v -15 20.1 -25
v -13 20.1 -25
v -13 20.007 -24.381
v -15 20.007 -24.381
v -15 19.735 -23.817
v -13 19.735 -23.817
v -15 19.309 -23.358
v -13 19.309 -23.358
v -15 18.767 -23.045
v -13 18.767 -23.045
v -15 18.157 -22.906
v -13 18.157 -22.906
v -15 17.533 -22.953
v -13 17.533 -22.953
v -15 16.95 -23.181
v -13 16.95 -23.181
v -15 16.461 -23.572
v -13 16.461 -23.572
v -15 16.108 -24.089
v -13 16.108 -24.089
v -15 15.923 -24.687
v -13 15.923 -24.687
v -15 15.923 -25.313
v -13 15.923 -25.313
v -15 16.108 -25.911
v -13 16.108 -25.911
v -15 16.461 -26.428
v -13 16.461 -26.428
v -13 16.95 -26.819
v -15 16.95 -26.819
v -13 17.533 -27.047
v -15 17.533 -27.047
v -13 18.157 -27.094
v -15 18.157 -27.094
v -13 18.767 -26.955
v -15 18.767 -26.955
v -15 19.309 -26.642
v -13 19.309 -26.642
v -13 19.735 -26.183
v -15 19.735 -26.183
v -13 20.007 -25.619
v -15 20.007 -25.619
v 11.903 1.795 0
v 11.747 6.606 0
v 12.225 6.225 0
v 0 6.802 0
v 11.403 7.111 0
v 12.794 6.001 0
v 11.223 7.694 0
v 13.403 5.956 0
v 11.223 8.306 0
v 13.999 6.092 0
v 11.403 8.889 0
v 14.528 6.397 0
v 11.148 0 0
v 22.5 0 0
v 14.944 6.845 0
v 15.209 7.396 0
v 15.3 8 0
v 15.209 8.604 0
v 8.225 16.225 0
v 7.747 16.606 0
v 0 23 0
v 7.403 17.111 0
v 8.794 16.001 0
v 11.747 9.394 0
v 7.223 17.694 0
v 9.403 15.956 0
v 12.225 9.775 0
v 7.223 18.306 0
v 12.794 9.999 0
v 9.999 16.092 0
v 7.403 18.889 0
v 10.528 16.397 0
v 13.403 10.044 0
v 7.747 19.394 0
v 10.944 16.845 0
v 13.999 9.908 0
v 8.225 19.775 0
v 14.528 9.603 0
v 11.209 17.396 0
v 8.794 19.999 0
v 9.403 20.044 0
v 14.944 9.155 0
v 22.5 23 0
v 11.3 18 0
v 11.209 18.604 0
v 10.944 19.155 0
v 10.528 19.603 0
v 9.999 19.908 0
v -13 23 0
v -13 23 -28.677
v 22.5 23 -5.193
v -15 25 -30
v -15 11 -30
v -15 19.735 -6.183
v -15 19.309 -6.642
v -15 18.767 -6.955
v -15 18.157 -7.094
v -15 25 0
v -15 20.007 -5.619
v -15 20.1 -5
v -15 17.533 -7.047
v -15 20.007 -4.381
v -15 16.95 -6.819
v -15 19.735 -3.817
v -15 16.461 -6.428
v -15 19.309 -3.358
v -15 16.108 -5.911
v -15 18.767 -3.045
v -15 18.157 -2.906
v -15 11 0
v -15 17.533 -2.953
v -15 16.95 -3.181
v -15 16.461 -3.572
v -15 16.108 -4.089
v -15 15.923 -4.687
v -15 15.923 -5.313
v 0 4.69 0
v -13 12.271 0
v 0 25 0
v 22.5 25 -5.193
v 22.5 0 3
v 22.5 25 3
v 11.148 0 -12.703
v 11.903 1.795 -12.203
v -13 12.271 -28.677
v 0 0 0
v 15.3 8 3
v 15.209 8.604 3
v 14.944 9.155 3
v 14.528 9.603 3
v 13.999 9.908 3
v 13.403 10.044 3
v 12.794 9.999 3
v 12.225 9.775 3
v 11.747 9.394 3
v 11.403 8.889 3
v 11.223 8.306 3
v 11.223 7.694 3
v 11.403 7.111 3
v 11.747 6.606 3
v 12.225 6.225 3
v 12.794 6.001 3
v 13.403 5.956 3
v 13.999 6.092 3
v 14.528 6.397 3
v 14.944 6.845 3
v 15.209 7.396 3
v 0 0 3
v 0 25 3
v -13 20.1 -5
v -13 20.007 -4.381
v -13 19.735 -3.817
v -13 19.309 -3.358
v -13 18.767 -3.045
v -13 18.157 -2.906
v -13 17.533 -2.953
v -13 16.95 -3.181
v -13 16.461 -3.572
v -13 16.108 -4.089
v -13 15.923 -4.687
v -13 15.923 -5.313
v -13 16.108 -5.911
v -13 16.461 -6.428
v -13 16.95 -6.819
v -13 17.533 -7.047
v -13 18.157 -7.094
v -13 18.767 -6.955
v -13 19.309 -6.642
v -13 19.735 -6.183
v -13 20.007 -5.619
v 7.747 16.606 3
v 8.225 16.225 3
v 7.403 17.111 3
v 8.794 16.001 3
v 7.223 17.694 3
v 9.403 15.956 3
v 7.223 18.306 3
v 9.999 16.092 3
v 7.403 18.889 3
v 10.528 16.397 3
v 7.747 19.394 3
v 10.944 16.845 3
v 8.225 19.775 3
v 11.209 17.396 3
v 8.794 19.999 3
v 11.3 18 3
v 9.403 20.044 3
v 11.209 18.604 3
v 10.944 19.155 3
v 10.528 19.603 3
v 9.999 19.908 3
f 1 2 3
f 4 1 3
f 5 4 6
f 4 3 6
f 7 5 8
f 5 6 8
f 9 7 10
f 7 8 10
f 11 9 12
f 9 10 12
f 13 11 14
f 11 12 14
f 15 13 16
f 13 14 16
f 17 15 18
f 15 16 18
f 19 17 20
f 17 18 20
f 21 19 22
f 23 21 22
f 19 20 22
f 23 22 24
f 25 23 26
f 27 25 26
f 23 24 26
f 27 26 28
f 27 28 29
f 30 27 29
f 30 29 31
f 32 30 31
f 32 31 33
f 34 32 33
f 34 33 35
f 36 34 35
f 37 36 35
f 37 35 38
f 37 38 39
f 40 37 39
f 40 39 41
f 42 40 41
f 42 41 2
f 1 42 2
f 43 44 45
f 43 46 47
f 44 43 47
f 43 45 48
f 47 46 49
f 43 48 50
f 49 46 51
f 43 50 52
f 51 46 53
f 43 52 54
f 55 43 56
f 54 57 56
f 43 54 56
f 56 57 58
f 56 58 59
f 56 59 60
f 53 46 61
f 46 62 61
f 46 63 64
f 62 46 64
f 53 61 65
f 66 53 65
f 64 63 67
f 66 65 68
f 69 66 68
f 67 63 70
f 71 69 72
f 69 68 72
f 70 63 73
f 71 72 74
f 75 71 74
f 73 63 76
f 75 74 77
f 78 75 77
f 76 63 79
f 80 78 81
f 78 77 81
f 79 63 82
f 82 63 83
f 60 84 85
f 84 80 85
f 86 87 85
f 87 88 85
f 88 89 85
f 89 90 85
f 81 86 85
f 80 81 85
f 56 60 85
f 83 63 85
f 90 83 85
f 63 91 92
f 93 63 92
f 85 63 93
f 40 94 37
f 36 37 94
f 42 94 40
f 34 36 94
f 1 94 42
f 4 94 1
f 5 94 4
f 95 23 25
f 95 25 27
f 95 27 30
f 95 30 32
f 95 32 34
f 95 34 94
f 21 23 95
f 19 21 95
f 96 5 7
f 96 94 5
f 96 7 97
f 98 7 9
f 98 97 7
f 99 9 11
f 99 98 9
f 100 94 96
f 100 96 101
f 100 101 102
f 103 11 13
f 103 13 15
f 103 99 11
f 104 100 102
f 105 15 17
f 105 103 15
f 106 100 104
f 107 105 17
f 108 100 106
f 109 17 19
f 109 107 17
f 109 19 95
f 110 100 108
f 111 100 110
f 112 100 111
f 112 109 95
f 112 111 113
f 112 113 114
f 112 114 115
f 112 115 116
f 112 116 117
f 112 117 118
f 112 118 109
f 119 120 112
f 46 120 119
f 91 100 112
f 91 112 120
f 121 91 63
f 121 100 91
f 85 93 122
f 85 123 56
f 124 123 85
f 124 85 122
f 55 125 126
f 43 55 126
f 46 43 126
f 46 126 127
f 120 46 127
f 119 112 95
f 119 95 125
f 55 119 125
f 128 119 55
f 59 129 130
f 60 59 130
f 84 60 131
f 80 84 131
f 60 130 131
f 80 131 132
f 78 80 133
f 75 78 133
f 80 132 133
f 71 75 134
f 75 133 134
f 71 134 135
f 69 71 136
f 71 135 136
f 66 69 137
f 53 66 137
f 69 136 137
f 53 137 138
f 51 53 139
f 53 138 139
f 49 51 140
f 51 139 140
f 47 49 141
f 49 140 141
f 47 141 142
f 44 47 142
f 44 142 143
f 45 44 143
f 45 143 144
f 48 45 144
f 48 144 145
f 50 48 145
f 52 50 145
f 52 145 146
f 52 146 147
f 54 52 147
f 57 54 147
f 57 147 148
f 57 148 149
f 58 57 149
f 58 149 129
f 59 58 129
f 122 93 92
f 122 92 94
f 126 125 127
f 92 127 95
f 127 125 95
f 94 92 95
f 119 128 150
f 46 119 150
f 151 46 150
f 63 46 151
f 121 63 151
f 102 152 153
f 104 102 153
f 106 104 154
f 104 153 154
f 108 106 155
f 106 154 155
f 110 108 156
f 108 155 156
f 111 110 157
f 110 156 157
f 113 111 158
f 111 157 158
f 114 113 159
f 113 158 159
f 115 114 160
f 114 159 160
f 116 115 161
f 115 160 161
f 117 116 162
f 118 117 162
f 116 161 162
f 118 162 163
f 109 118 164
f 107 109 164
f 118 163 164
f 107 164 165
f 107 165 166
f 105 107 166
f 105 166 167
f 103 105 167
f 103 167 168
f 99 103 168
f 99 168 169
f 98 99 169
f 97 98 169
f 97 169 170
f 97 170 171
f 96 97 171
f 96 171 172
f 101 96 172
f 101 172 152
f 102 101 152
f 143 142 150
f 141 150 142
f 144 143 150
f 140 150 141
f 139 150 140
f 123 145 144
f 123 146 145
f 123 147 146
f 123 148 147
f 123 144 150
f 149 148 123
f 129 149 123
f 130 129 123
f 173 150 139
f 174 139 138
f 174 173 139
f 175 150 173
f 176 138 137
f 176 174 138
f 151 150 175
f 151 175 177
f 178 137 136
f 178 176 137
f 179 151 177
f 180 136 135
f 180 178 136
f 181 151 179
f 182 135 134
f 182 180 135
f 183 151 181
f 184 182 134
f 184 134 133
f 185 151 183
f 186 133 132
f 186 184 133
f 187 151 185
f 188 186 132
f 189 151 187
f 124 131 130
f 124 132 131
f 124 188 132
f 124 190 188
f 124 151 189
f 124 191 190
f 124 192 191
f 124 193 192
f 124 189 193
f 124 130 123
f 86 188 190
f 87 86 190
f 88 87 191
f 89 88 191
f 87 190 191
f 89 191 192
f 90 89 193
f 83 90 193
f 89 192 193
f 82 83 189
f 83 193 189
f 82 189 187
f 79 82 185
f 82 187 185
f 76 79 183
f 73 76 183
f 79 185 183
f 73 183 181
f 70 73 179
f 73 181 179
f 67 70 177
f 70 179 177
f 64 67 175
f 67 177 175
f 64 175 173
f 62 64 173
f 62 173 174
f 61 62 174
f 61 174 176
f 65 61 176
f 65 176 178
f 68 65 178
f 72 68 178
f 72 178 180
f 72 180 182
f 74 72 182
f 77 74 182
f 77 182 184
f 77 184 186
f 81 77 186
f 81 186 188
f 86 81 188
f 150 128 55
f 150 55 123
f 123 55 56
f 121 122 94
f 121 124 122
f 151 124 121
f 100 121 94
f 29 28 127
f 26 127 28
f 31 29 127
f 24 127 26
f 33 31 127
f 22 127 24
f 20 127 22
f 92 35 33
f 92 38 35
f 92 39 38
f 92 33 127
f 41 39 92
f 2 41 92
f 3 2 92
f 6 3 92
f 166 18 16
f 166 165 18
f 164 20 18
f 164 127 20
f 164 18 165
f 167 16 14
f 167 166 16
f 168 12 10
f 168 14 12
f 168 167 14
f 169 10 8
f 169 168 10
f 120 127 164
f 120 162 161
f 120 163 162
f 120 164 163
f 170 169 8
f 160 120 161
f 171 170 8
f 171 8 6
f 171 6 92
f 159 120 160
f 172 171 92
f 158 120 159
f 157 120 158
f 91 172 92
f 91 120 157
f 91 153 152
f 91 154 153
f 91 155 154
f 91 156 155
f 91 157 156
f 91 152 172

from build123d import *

# Parameters (mm, degrees)
F0_W     = 22.5
F0_H     = 25
F1_DEPTH = 3
F2_R     = 2.05
F3_DEPTH = 25
F4_W     = 2
F4_H     = 2
F4_W_2   = 35.5
F5_DEPTH = 30
F7_DEPTH = 25
F8_R     = 2.1
F9_DEPTH = 25


with BuildPart() as f1:
    # F0 (on Top) → F1 (new body)
    with BuildSketch(Plane.XY):
        with Locations((11.25, 12.5)):
            Rectangle(F0_W, F0_H)
    extrude(amount=F1_DEPTH)

    # F2 (on face) → F3 (cut)
    with BuildSketch(Plane.XY.offset(3)):
        with Locations((9.25, 18)):
            Circle(F2_R)
        with Locations((13.25, 8)):
            Circle(F2_R)
    extrude(amount=-F3_DEPTH, mode=Mode.SUBTRACT)

    # F4 (on Top) → F5 (join)
    with BuildSketch(Plane.XY):
        with Locations((-14, 24)):
            Rectangle(F4_W, F4_H)
        with Locations((4.75, 24)):
            Rectangle(F4_W_2, F4_H)
        Polygon((-13, 23), (-15, 23), (-15, 11), (-14.244832817, 12.7950885872), (-13, 12.2714058573), align=None)
        Polygon((-14.244832817, 12.7950885872), (-15, 11), (-13, 11), (-13, 12.2714058573), align=None)
        Polygon((-13, 11), (-15, 11), (11.1478185281, 0), (11.9029857111, 1.7950885872), (-13, 12.2714058573), align=None)
    extrude(amount=-F5_DEPTH)

    # F6 (on Front) → F7 (cut)
    with BuildSketch(Plane.XZ):
        Polygon((22.5, -30), (22.5, -5.1932623562), (-15, -30), align=None)
    extrude(amount=-F7_DEPTH, mode=Mode.SUBTRACT)

    # F8 (on Right) → F9 (cut)
    with BuildSketch(Plane.YZ):
        with Locations((18, -5)):
            Circle(F8_R)
        with Locations((18, -25)):
            Circle(F8_R)
    extrude(amount=-F9_DEPTH, mode=Mode.SUBTRACT)


solid = f1.part
